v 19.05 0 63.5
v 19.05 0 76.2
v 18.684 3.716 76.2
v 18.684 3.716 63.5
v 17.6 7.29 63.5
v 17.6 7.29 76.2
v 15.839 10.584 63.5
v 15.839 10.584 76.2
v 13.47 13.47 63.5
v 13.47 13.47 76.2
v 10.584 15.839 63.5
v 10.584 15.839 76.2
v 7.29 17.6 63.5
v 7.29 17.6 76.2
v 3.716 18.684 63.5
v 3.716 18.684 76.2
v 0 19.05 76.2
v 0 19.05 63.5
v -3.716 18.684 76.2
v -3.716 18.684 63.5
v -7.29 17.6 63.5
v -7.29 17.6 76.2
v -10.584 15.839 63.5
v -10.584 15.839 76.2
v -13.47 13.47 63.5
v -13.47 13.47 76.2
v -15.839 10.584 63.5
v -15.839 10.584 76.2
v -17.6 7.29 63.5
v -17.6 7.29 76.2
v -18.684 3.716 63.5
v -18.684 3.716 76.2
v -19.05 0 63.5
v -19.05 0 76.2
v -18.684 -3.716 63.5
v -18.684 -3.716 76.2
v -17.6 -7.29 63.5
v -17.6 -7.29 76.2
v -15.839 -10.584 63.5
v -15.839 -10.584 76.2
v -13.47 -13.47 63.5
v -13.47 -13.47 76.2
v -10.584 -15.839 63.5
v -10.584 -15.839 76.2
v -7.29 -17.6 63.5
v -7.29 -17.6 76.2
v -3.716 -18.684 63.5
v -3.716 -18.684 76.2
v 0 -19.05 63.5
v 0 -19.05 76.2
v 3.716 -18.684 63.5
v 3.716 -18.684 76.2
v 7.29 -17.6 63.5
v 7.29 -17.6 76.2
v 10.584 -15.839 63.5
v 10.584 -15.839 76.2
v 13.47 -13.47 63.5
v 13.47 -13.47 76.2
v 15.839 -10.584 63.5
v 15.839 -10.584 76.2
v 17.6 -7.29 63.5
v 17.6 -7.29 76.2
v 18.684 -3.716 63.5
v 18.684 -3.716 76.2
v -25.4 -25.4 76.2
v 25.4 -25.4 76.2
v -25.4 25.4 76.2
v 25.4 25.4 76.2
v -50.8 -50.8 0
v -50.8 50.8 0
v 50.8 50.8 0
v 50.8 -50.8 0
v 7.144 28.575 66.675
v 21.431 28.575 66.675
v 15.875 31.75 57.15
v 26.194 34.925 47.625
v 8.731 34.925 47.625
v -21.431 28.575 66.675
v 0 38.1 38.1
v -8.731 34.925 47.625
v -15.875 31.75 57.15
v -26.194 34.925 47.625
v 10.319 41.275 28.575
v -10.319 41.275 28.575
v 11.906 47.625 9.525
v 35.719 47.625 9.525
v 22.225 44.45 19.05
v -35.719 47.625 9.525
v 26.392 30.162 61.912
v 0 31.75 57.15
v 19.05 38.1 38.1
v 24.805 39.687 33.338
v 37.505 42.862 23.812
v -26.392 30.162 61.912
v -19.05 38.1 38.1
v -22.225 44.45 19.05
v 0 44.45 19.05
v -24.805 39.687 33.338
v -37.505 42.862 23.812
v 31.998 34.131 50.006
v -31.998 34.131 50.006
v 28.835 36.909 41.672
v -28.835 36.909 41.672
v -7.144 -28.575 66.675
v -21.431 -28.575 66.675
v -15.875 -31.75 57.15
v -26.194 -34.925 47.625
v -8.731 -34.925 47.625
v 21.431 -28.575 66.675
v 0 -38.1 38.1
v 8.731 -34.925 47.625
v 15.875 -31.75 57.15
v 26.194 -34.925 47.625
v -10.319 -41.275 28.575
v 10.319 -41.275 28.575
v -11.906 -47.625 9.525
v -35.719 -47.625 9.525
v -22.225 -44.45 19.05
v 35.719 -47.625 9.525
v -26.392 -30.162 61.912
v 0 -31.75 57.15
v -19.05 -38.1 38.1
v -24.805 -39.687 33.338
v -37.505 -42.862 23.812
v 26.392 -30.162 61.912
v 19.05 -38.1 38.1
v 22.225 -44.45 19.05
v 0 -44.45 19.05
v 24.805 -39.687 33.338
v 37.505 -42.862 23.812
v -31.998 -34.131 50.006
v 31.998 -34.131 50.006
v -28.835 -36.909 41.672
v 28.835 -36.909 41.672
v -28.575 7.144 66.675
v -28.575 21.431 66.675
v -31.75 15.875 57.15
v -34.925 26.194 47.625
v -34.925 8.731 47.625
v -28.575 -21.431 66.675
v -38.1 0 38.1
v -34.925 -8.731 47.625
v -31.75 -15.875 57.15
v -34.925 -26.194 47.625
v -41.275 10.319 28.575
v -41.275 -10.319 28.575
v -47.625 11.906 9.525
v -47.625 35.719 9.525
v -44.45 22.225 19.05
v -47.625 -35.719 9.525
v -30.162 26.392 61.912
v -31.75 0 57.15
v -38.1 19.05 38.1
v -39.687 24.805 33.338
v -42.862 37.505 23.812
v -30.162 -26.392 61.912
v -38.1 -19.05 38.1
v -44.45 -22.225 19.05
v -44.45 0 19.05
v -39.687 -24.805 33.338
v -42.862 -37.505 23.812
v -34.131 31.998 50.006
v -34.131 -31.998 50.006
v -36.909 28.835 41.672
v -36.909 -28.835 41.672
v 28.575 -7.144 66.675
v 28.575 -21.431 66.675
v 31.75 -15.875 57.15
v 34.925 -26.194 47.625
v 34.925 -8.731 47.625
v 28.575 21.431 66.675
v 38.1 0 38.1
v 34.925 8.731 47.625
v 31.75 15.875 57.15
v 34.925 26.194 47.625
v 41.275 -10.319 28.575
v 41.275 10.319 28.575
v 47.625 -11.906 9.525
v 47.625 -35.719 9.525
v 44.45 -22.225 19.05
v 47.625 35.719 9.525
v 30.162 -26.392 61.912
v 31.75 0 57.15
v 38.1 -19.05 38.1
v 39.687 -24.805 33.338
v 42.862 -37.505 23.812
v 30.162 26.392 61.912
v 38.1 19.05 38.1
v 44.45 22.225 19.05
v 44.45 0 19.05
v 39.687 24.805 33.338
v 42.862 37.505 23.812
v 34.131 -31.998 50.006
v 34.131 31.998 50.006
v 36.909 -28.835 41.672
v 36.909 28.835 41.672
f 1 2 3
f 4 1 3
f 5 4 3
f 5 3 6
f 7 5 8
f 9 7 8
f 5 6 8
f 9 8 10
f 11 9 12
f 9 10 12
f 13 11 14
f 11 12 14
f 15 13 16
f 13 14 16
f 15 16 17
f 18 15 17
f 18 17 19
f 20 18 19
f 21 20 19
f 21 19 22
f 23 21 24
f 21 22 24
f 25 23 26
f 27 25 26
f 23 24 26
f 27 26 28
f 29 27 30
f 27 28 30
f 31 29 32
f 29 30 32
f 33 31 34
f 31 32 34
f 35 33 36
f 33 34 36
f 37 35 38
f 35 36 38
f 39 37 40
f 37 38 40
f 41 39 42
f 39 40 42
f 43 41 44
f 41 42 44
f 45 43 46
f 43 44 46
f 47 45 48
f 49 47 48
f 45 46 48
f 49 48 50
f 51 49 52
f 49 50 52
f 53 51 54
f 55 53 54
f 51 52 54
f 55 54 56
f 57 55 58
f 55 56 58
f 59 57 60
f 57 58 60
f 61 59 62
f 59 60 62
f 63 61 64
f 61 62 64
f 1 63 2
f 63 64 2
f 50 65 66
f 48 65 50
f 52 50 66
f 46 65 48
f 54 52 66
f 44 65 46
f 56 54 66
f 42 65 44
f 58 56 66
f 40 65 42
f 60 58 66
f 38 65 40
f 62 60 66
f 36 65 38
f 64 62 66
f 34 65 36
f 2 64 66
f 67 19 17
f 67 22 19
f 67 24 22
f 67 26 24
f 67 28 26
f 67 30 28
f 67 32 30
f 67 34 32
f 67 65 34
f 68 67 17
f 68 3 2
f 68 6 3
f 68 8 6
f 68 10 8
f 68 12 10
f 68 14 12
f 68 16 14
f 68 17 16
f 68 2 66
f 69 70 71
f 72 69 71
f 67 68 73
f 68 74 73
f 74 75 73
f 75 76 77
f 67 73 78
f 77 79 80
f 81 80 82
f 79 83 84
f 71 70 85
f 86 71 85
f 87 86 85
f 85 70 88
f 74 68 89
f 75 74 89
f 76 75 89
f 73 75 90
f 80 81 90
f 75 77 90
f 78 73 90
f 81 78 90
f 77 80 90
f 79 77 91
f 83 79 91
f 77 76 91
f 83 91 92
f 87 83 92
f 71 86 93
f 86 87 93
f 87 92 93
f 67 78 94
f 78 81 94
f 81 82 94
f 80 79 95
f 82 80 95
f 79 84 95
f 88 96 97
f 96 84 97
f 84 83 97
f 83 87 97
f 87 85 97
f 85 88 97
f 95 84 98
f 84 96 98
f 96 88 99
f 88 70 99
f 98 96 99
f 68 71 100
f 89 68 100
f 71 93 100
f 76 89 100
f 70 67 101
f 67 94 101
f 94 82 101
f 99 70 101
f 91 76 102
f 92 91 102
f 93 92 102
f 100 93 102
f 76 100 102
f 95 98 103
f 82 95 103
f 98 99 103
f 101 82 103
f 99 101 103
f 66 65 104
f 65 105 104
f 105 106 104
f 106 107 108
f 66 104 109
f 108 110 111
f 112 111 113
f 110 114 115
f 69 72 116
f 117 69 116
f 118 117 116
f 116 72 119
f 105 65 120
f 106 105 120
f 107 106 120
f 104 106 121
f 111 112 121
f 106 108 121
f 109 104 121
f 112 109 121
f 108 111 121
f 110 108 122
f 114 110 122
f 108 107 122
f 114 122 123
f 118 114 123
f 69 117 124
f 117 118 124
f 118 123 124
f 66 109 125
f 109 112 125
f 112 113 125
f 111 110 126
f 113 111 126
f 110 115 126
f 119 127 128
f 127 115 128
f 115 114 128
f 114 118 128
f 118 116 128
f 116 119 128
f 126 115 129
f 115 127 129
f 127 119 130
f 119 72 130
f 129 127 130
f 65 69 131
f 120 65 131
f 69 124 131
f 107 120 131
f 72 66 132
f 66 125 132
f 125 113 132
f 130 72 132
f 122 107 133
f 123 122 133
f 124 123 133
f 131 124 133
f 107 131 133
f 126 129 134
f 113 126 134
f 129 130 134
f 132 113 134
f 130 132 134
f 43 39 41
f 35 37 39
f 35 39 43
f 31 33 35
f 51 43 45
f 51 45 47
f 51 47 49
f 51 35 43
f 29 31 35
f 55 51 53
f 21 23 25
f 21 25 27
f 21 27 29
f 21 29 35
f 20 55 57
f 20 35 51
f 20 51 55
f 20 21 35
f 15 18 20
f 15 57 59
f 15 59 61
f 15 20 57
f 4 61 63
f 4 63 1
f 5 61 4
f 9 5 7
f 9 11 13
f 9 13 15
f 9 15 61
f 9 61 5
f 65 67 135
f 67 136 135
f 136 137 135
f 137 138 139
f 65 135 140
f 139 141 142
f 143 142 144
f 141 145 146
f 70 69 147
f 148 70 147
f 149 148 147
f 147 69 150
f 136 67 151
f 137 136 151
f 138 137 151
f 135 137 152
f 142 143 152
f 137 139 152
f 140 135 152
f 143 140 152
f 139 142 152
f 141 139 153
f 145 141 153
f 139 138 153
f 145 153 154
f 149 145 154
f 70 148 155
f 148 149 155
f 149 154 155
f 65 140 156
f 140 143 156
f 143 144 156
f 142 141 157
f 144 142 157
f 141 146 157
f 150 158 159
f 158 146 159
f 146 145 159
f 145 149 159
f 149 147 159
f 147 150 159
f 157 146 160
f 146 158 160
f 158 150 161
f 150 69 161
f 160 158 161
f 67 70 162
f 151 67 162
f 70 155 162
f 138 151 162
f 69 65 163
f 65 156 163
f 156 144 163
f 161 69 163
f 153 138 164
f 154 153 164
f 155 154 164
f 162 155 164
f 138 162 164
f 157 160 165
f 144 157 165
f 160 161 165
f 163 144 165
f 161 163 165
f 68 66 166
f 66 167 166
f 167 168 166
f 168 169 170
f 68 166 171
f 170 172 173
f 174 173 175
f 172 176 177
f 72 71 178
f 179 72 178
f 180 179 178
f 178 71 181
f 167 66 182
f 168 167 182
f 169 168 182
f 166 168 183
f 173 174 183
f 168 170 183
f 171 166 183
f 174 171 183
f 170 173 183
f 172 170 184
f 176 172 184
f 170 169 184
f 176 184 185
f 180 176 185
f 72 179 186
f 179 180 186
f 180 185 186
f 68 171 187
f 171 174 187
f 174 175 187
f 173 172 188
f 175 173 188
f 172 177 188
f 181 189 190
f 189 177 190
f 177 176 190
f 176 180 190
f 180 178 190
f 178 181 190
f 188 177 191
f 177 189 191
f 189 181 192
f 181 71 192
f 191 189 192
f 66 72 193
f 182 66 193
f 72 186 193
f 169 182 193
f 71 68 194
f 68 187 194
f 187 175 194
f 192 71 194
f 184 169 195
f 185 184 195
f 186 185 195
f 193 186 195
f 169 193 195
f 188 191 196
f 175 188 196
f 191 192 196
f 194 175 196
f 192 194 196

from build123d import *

# Parameters (mm, degrees)
F2_W     = 50.8
F2_H     = 50.8
F0_W     = 101.6
F0_H     = 101.6
F4_R     = 19.05
F5_DEPTH = 12.7


with BuildPart() as f3:
    # F2 (on offset) → F3 section 0
    with BuildSketch(Plane.XY.offset(76.2)):
        Rectangle(F2_W, F2_H)
    # F0 (on Top) → F3 section 1
    with BuildSketch(Plane.XY):
        Rectangle(F0_W, F0_H)
    loft()

    # F4 (on face) → F5 (cut)
    with BuildSketch(Plane.XY.offset(76.2)):
        Circle(F4_R)
    extrude(amount=-F5_DEPTH, mode=Mode.SUBTRACT)


solid = f3.part
